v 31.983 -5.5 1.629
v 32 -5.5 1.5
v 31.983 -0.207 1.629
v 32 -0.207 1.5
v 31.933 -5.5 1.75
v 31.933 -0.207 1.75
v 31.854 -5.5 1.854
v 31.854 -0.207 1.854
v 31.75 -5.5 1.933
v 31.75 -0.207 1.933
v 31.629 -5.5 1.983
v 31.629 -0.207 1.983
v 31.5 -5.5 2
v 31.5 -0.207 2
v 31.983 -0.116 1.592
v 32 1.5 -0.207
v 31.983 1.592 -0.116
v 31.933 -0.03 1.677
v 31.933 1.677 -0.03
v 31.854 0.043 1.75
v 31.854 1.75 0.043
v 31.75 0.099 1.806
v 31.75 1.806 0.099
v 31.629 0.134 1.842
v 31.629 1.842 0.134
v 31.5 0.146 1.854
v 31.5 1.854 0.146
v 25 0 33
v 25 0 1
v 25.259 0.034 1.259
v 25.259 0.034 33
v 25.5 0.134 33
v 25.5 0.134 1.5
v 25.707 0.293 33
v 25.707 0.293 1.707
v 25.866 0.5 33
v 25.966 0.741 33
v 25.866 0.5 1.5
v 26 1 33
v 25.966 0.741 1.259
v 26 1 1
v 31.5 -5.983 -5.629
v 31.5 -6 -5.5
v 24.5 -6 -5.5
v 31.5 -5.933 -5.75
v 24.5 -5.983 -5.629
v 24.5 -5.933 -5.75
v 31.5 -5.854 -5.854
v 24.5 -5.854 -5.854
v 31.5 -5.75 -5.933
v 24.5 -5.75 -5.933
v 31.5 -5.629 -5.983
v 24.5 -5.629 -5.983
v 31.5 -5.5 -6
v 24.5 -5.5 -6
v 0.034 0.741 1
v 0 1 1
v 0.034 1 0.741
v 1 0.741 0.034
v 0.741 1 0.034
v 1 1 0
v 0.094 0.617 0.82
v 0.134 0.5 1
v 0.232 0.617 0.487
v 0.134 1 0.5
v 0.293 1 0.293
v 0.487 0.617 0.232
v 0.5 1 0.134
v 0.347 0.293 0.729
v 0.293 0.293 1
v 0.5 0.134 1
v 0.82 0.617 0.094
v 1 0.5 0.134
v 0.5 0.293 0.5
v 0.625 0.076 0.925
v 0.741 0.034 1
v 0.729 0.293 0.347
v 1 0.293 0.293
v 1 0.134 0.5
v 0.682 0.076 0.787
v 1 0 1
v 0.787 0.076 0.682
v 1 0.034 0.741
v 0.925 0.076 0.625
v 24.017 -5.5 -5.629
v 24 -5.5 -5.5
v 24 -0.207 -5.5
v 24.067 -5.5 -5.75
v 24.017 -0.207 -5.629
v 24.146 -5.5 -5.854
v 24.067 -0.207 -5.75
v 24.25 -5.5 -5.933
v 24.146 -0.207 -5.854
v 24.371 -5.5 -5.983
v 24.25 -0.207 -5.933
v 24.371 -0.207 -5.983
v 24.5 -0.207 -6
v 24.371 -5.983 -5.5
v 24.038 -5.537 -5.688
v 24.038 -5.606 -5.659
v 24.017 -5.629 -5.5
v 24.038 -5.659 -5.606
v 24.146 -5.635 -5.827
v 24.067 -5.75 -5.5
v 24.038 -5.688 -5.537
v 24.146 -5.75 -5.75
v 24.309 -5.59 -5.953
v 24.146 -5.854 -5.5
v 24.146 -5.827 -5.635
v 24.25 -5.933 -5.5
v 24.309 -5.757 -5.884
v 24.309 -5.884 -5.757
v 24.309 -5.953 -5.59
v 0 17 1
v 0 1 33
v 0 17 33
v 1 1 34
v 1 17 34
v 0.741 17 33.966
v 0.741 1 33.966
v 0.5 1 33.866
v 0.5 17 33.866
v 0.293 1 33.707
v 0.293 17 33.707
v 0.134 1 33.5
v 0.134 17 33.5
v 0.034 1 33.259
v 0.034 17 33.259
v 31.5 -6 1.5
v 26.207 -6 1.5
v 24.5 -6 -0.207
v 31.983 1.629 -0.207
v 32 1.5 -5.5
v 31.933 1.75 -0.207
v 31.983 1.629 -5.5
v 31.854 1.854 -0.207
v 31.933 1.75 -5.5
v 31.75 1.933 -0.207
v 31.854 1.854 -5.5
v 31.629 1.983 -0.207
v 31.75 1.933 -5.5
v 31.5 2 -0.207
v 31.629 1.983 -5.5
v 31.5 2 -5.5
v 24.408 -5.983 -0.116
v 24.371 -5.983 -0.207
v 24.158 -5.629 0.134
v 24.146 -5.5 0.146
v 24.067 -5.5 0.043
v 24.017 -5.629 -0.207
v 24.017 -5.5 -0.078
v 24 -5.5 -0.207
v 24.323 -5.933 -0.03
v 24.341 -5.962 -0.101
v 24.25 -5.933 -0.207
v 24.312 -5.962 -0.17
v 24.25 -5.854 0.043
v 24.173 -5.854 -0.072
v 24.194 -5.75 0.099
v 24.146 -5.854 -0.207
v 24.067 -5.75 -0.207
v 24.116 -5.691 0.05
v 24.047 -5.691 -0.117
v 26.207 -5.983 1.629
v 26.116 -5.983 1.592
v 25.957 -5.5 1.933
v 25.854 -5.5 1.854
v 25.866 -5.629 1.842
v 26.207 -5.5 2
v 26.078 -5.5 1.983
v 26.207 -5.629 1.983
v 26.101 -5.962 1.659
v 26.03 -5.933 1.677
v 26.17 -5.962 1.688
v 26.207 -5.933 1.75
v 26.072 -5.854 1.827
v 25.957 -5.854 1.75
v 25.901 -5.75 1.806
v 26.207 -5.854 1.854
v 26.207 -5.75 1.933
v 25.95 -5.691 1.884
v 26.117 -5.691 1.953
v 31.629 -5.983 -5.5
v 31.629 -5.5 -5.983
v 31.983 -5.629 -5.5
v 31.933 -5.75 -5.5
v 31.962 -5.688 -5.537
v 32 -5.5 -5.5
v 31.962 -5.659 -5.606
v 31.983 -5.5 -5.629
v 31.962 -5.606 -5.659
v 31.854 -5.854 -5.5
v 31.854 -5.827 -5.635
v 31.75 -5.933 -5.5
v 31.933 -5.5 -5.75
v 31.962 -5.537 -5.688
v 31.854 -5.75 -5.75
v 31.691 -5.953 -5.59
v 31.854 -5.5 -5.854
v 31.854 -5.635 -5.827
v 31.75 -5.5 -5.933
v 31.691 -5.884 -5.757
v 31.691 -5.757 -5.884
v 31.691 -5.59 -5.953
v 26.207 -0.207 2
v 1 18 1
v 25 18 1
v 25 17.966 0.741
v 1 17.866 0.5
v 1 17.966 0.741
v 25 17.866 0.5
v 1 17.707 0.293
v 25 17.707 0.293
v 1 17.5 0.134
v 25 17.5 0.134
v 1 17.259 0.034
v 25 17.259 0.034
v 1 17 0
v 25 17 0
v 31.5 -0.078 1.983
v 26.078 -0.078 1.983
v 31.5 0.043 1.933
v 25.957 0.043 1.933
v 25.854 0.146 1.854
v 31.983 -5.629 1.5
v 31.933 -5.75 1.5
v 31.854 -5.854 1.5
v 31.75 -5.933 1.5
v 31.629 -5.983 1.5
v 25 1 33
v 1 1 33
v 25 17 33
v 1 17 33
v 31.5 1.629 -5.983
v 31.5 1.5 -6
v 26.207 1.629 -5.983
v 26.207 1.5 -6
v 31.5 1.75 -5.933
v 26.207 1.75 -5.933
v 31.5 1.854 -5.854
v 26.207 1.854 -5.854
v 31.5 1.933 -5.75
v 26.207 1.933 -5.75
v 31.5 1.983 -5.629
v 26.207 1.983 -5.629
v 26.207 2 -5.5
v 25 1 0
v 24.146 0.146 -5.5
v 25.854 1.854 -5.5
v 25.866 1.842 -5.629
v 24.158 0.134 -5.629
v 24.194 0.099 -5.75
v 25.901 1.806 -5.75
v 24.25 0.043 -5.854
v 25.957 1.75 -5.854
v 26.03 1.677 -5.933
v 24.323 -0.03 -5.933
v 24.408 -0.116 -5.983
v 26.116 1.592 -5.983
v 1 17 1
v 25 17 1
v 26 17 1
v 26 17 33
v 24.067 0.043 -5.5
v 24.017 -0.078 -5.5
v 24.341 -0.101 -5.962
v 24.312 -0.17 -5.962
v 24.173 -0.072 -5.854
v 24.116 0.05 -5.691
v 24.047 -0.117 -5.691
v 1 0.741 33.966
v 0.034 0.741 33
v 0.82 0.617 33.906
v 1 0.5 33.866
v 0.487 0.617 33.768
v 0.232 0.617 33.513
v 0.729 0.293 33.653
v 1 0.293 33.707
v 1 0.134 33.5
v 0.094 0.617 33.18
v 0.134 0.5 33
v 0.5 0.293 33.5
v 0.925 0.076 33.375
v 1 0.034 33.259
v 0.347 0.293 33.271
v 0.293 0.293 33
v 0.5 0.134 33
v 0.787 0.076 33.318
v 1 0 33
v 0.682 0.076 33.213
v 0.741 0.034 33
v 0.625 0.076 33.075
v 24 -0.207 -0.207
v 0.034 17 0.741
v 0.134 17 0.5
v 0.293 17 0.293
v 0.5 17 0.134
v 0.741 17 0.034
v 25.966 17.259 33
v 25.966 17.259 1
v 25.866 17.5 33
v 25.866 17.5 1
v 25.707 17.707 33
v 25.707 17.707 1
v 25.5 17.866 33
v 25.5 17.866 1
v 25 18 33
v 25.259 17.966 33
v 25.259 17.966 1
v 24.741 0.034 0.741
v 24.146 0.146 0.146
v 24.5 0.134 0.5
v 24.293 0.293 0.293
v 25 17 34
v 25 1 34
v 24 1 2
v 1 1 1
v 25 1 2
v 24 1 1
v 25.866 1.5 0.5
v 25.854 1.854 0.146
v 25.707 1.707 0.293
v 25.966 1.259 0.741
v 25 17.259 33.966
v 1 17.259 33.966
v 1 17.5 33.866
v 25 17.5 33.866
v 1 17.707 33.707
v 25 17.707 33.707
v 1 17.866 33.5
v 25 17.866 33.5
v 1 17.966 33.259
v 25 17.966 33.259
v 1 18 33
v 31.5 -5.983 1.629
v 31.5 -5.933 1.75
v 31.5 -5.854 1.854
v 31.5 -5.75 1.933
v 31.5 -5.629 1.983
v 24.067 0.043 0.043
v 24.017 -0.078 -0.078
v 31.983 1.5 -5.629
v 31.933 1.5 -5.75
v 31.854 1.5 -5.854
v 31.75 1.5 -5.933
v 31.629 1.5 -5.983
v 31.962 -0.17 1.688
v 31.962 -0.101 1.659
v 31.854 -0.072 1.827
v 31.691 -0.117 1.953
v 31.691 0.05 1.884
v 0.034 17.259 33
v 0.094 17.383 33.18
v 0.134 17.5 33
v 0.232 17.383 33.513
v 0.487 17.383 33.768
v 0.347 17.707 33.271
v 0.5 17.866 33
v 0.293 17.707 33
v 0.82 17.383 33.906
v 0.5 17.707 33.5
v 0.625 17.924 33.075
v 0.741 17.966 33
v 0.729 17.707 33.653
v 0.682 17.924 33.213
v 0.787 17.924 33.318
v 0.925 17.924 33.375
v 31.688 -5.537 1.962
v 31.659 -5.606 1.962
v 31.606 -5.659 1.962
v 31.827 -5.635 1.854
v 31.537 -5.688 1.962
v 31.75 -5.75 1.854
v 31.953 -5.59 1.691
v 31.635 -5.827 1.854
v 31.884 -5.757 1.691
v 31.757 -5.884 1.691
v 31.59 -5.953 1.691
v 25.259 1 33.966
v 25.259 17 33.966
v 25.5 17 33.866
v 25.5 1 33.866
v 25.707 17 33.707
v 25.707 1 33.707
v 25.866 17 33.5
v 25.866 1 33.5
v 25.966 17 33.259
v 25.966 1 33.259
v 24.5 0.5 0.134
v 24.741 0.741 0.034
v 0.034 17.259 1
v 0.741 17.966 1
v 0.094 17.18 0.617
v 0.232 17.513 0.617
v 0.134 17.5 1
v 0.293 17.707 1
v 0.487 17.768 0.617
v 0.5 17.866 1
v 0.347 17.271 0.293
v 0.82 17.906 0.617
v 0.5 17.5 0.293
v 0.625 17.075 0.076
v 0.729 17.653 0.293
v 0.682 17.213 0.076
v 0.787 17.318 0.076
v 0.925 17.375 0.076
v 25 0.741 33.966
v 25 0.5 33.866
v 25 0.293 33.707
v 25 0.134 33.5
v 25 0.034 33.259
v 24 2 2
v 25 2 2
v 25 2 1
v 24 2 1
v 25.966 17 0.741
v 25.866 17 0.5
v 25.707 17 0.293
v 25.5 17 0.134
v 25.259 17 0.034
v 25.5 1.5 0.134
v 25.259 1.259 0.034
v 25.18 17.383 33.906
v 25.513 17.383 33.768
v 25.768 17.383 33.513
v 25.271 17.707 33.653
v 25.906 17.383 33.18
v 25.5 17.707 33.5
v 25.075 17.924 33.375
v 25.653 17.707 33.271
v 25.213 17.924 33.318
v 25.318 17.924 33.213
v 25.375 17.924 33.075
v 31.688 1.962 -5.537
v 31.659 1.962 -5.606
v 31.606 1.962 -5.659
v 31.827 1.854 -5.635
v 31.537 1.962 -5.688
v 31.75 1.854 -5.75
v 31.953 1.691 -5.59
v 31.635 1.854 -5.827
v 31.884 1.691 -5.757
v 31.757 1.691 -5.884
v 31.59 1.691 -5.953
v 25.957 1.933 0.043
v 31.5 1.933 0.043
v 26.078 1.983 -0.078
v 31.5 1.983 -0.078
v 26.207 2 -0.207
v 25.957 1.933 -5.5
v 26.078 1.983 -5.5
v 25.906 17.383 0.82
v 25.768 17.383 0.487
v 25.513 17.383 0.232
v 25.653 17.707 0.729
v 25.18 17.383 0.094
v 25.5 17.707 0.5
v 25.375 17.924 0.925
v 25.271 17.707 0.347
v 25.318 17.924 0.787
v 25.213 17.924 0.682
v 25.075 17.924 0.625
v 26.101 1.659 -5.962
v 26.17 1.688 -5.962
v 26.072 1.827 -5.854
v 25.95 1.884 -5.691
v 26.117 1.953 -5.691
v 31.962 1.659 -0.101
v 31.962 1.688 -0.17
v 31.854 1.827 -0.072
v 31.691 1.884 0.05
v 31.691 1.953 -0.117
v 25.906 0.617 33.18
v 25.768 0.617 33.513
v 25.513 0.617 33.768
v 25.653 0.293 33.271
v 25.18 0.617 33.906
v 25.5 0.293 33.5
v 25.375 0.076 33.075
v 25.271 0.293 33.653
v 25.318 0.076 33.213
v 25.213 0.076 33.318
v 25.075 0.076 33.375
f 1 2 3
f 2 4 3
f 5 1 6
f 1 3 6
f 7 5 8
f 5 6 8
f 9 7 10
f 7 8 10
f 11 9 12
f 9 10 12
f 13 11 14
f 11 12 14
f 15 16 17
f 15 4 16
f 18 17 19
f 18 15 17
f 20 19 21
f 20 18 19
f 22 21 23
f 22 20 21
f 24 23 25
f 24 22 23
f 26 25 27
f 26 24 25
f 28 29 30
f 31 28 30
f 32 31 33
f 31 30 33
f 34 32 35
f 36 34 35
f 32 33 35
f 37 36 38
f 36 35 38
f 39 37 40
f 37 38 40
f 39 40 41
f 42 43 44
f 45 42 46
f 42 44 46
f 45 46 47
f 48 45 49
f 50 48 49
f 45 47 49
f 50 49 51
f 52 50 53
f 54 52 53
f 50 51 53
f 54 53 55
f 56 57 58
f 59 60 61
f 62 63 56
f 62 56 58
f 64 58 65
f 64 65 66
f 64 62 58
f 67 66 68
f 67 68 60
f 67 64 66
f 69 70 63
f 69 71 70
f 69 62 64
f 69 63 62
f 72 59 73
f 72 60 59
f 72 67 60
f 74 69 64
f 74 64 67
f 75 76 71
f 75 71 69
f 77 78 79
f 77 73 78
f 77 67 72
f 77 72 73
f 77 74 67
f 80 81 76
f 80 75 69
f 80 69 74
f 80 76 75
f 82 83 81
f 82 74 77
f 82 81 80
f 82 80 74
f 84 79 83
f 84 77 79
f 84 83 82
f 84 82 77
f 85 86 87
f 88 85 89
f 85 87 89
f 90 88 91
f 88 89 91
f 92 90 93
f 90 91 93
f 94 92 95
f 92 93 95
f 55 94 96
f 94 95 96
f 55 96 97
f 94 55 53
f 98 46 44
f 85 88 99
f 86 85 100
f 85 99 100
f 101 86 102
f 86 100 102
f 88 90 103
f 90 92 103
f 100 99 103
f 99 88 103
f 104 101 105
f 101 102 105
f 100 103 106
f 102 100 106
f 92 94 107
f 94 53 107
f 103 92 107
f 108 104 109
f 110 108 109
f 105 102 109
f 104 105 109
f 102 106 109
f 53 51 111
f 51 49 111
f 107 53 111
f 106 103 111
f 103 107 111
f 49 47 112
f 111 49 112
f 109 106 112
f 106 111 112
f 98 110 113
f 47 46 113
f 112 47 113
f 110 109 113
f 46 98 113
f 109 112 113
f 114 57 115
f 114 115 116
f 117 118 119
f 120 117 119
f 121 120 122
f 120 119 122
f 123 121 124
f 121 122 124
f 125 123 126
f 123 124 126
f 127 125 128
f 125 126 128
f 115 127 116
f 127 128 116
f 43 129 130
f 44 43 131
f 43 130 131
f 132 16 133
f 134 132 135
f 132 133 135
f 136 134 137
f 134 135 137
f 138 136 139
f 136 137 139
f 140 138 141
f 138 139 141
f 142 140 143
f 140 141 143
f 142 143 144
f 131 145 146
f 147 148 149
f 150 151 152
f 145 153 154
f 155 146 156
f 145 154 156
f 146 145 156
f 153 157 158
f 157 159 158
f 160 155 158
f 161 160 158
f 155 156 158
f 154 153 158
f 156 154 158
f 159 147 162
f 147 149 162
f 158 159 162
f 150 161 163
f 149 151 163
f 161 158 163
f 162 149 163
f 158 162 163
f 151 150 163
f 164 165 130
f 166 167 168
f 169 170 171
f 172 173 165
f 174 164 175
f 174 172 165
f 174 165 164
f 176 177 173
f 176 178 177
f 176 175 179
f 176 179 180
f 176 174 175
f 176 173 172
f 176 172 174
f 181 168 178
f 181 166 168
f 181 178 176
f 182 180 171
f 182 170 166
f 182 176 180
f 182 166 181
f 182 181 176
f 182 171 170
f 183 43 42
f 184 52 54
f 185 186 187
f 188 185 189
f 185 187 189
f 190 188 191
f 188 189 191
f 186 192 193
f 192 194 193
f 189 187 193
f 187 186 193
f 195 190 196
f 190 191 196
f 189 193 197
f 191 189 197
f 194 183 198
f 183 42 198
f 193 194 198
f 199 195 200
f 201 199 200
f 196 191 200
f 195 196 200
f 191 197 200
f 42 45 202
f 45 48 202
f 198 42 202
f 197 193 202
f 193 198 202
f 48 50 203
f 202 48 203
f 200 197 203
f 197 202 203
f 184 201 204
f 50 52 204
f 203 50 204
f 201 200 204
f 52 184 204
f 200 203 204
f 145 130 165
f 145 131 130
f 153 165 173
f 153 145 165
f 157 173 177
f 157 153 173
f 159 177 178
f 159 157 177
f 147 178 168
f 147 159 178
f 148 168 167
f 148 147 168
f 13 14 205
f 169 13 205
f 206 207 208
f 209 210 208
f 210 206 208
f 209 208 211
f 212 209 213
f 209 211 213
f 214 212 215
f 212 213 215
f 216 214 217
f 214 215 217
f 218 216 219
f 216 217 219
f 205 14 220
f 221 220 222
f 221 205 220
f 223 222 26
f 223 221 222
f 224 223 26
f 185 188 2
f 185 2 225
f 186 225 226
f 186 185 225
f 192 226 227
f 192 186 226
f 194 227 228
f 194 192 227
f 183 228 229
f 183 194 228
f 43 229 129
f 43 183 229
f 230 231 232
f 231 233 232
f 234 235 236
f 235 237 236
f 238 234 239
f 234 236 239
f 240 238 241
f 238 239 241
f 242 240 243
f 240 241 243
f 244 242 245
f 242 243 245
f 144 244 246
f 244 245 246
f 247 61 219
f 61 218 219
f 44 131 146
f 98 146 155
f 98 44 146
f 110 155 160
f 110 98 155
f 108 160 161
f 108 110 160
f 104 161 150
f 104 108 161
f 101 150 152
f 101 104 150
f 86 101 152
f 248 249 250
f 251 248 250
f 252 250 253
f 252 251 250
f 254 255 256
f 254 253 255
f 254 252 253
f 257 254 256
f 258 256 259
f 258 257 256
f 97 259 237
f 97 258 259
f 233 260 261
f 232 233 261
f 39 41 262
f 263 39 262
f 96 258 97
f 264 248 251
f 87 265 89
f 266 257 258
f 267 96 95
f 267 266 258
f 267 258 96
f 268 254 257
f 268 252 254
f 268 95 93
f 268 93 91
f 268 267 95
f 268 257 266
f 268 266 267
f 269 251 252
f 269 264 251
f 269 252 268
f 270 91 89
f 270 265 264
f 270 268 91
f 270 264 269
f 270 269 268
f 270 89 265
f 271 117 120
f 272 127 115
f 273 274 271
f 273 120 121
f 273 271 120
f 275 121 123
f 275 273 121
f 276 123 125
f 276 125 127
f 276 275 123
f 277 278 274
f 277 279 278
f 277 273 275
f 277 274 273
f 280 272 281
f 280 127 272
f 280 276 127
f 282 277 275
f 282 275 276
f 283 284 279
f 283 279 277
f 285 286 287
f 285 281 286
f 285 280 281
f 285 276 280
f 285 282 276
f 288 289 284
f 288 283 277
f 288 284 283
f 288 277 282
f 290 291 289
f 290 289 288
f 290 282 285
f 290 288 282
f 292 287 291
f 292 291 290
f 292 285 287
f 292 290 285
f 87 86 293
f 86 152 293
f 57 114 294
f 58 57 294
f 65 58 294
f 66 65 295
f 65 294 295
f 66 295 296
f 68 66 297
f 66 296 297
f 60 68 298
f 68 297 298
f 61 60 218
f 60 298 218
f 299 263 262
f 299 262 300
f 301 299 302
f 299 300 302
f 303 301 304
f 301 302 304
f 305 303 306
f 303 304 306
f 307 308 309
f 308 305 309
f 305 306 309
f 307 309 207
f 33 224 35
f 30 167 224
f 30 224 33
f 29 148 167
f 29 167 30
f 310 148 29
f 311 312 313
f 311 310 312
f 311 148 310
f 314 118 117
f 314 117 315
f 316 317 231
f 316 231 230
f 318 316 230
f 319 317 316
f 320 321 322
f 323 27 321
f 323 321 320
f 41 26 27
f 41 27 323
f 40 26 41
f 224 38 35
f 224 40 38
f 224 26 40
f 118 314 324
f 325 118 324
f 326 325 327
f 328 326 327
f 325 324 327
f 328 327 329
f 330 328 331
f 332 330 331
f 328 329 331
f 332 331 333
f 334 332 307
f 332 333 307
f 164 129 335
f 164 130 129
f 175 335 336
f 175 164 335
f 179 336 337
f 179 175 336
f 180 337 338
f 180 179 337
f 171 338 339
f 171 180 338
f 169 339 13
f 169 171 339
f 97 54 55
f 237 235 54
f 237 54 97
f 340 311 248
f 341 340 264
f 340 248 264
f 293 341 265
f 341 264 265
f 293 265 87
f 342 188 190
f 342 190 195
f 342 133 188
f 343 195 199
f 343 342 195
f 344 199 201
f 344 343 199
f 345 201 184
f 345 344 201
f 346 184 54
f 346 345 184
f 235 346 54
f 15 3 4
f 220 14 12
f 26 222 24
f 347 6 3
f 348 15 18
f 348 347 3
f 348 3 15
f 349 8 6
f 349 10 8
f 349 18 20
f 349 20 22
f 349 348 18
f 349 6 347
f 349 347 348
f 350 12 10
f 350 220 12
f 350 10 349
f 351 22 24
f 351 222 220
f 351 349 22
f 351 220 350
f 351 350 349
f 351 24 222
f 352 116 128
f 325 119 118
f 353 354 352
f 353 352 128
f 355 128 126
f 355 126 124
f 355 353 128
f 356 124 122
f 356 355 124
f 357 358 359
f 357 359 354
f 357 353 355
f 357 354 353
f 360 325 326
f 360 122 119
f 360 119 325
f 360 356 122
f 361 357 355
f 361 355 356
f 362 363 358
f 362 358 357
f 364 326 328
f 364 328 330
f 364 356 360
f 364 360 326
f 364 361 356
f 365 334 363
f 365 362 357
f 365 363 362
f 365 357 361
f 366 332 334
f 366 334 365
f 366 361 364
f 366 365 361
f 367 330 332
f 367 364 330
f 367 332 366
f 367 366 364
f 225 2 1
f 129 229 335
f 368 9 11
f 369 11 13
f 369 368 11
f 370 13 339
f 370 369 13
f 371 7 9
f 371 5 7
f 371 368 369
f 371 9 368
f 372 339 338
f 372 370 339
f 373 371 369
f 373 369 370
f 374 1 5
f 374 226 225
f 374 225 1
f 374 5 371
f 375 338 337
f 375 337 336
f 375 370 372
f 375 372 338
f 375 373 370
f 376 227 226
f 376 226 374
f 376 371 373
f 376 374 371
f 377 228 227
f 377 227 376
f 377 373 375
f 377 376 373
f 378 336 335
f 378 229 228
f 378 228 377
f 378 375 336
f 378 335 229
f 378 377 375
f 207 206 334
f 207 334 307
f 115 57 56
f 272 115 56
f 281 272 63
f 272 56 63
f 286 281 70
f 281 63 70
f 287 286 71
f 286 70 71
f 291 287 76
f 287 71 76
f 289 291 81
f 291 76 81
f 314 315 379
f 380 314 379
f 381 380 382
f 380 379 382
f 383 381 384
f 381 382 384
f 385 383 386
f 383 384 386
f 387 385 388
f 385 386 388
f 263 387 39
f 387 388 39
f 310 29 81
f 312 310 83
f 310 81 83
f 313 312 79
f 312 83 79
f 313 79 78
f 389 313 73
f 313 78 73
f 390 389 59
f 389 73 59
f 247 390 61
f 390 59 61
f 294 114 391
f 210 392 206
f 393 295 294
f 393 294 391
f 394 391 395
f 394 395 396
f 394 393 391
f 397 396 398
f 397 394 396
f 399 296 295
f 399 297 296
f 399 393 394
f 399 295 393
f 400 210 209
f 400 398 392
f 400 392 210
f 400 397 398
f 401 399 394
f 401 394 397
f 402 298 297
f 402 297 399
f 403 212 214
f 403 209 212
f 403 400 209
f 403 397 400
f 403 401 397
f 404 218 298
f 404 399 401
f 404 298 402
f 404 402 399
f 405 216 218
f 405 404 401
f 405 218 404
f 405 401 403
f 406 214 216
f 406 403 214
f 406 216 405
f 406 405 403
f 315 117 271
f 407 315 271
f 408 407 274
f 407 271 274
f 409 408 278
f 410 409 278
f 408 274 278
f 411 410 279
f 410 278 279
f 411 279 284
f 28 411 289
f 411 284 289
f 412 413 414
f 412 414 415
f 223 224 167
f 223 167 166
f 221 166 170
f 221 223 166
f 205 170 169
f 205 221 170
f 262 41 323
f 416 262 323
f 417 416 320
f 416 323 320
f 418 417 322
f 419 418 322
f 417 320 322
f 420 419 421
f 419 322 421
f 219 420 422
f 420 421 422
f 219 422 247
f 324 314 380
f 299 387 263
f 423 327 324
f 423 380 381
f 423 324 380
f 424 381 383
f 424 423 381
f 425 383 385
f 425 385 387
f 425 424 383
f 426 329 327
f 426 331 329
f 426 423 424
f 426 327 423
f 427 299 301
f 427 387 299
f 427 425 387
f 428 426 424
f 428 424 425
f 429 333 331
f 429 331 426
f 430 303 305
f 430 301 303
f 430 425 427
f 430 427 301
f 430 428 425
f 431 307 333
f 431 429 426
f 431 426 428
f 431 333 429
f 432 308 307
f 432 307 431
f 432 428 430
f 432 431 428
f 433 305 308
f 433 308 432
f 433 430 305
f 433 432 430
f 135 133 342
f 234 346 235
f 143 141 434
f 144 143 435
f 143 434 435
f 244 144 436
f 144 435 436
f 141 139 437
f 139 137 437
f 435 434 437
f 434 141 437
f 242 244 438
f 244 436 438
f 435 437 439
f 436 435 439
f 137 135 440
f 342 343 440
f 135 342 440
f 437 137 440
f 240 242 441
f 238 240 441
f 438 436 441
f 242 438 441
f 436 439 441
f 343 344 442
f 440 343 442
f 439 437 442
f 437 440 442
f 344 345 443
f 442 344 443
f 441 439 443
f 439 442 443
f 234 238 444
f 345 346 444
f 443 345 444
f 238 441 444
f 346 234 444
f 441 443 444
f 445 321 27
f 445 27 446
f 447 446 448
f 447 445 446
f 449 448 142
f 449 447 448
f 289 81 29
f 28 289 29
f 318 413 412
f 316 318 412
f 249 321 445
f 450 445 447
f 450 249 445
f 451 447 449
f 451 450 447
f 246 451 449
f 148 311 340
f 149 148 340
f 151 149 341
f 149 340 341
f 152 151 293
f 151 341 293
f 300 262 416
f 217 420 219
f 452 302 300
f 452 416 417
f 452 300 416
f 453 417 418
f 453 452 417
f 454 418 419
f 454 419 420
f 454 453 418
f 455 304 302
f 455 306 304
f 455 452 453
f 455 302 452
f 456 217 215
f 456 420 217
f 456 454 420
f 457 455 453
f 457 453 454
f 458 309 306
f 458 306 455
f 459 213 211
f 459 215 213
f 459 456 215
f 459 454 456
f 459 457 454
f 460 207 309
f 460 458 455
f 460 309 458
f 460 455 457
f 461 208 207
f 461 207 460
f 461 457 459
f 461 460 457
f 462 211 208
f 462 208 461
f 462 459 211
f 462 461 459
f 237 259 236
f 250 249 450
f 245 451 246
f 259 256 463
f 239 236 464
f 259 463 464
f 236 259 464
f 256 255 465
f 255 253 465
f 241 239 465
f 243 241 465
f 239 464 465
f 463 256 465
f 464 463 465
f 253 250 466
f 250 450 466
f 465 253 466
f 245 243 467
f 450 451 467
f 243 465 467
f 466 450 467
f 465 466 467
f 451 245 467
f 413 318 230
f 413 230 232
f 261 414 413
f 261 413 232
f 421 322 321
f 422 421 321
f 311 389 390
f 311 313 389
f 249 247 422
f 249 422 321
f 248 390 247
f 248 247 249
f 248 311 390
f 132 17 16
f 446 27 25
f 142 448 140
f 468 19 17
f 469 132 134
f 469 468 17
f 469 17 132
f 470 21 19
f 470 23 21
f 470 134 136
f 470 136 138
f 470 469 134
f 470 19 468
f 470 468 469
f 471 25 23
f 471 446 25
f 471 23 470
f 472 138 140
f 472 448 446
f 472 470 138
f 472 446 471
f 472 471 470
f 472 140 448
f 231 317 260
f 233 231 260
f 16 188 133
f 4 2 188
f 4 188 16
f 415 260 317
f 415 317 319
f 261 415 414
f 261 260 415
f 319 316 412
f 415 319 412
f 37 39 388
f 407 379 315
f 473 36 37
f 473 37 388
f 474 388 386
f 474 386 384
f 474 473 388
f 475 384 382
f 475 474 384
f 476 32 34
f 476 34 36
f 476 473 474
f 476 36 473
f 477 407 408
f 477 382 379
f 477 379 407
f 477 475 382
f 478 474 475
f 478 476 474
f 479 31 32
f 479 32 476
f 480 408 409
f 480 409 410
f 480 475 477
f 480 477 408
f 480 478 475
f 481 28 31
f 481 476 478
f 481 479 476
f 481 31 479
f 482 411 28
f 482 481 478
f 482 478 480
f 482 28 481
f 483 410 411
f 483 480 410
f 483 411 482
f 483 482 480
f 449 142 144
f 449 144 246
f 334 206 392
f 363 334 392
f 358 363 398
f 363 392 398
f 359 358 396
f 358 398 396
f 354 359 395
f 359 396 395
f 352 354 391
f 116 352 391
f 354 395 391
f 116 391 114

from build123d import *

# Parameters (mm, degrees)
SKETCH1_W                = 26
SKETCH1_H                = 18
BOSS_EXTRUDE1_DEPTH      = 34
SHELL1_T                 = 1
BOSS_EXTRUDE3_DEPTH      = 6
BOSS_EXTRUDE3_DEPTH_BACK = 2
SKETCH2_W                = 8
SKETCH2_H                = 8
CHAMFER2_SIZE            = 2
FILLET1_R                = 1
FILLET2_R                = 0.5


with BuildPart() as part:
    # Sketch1 → Boss-Extrude1 (new body)
    with BuildSketch(Plane.XY):
        with Locations((13, 9)):
            Rectangle(SKETCH1_W, SKETCH1_H)
    extrude(amount=BOSS_EXTRUDE1_DEPTH)

    # Shell1 (no face opened: a closed hollow body)
    add(offset(amount=-SHELL1_T, mode=Mode.PRIVATE), mode=Mode.SUBTRACT)

    # Sketch2 → Boss-Extrude3 (add, two sides: drawn at the far end of the back side and taken through both)
    with BuildSketch(Plane(origin=(0, 0, 0), x_dir=(-1, 0, 0), z_dir=(0, 0, -1)).offset(-BOSS_EXTRUDE3_DEPTH_BACK)):
        with Locations((-28, -2)):
            Rectangle(SKETCH2_W, SKETCH2_H)
    extrude(amount=BOSS_EXTRUDE3_DEPTH + BOSS_EXTRUDE3_DEPTH_BACK)

    # Chamfer2
    chamfer2_edges = [part.edges().sort_by_distance(p)[0] for p in [
        (24, -3, 2),
        (24, 2, -3),
        (29, 2, 2),
    ]]
    chamfer(chamfer2_edges, length=CHAMFER2_SIZE)

    # Fillet1
    # the kernel refuses this fillet: 1 mm, written as the material it takes off along each edge
    with BuildSketch(Plane(origin=(1, 17, 1), x_dir=(0, 1, 0), z_dir=(0, 0, -1))) as fillet1_piece_1_section:
        Polygon((0, 0), (FILLET1_R, 0), (FILLET1_R, -FILLET1_R), (0, -FILLET1_R), align=None)
    fillet1_piece_1 = extrude(amount=FILLET1_R, mode=Mode.PRIVATE)
    fillet1_piece_1 = fillet1_piece_1 - Plane(origin=(1, 17, 1), x_dir=(0.7071067811865476, -0.7071067811865475, 0), z_dir=(0, 0, -1)) * Sphere(FILLET1_R, mode=Mode.PRIVATE)
    add(fillet1_piece_1, mode=Mode.SUBTRACT)
    with BuildSketch(Plane(origin=(1, 1, 1), x_dir=(0, 0, -1), z_dir=(0, -1, 0))) as fillet1_piece_2_section:
        Polygon((0, 0), (FILLET1_R, 0), (FILLET1_R, -FILLET1_R), (0, -FILLET1_R), align=None)
    fillet1_piece_2 = extrude(amount=FILLET1_R, mode=Mode.PRIVATE)
    fillet1_piece_2 = fillet1_piece_2 - Plane(origin=(1, 1, 1), x_dir=(0.7071067811865475, 0, 0.7071067811865475), z_dir=(0, -1, 0)) * Sphere(FILLET1_R, mode=Mode.PRIVATE)
    add(fillet1_piece_2, mode=Mode.SUBTRACT)
    with BuildSketch(Plane(origin=(25, 17, 1), x_dir=(0, 0, -1), z_dir=(0, 1, 0))) as fillet1_piece_3_section:
        Polygon((0, 0), (FILLET1_R, 0), (FILLET1_R, -FILLET1_R), (0, -FILLET1_R), align=None)
    fillet1_piece_3 = extrude(amount=FILLET1_R, mode=Mode.PRIVATE)
    fillet1_piece_3 = fillet1_piece_3 - Plane(origin=(25, 17, 1), x_dir=(-0.7071067811865475, 0, 0.7071067811865475), z_dir=(0, 1, 0)) * Sphere(FILLET1_R, mode=Mode.PRIVATE)
    add(fillet1_piece_3, mode=Mode.SUBTRACT)
    with BuildSketch(Plane(origin=(1, 1, 33), x_dir=(-1, 0, 0), z_dir=(0, -1, 0))) as fillet1_piece_4_section:
        Polygon((0, 0), (FILLET1_R, 0), (FILLET1_R, -FILLET1_R), (0, -FILLET1_R), align=None)
    fillet1_piece_4 = extrude(amount=FILLET1_R, mode=Mode.PRIVATE)
    fillet1_piece_4 = fillet1_piece_4 - Plane(origin=(1, 1, 33), x_dir=(0.7071067811865475, 0, -0.7071067811865475), z_dir=(0, -1, 0)) * Sphere(FILLET1_R, mode=Mode.PRIVATE)
    add(fillet1_piece_4, mode=Mode.SUBTRACT)
    with BuildSketch(Plane(origin=(25, 1, 33), x_dir=(1, 0, 0), z_dir=(0, -1, 0))) as fillet1_piece_5_section:
        Polygon((0, 0), (FILLET1_R, 0), (FILLET1_R, FILLET1_R), (0, FILLET1_R), align=None)
    fillet1_piece_5 = extrude(amount=FILLET1_R, mode=Mode.PRIVATE)
    fillet1_piece_5 = fillet1_piece_5 - Plane(origin=(25, 1, 33), x_dir=(-0.7071067811865475, 0, -0.7071067811865475), z_dir=(0, -1, 0)) * Sphere(FILLET1_R, mode=Mode.PRIVATE)
    add(fillet1_piece_5, mode=Mode.SUBTRACT)
    with BuildSketch(Plane(origin=(25, 17, 33), x_dir=(1, 0, 0), z_dir=(0, 1, 0))) as fillet1_piece_6_section:
        Polygon((0, 0), (FILLET1_R, 0), (FILLET1_R, -FILLET1_R), (0, -FILLET1_R), align=None)
    fillet1_piece_6 = extrude(amount=FILLET1_R, mode=Mode.PRIVATE)
    fillet1_piece_6 = fillet1_piece_6 - Plane(origin=(25, 17, 33), x_dir=(-0.7071067811865475, 0, -0.7071067811865475), z_dir=(0, 1, 0)) * Sphere(FILLET1_R, mode=Mode.PRIVATE)
    add(fillet1_piece_6, mode=Mode.SUBTRACT)
    with BuildSketch(Plane(origin=(1, 17, 33), x_dir=(-1, 0, 0), z_dir=(0, 1, 0))) as fillet1_piece_7_section:
        Polygon((0, 0), (FILLET1_R, 0), (FILLET1_R, FILLET1_R), (0, FILLET1_R), align=None)
    fillet1_piece_7 = extrude(amount=FILLET1_R, mode=Mode.PRIVATE)
    fillet1_piece_7 = fillet1_piece_7 - Plane(origin=(1, 17, 33), x_dir=(0.7071067811865475, 0, -0.7071067811865475), z_dir=(0, 1, 0)) * Sphere(FILLET1_R, mode=Mode.PRIVATE)
    add(fillet1_piece_7, mode=Mode.SUBTRACT)
    with BuildSketch(Plane(origin=(0, 17, 0), x_dir=(1, 0, 0), z_dir=(0, -1, 0)), Plane(origin=(26, 1, 34), x_dir=(0, 0, -1), z_dir=(0, 1, 0)), Plane(origin=(0, 17, 34), x_dir=(0, 0, -1), z_dir=(0, -1, 0))) as fillet1_piece_8:
        with BuildLine():
            CenterArc((FILLET1_R, FILLET1_R), FILLET1_R, 180, 90)
            Line((0, FILLET1_R), (0, 0))
            Line((0, 0), (FILLET1_R, 0))
        make_face()
    extrude(amount=16, mode=Mode.SUBTRACT)
    with BuildSketch(Plane(origin=(1, 0, 0), x_dir=(0, 0, 1), z_dir=(1, 0, 0))) as fillet1_piece_9_section:
        with BuildLine():
            CenterArc((FILLET1_R, -FILLET1_R), FILLET1_R, 90, 90)
            Line((0, -FILLET1_R), (0, 0))
            Line((0, 0), (FILLET1_R, 0))
        make_face()
    fillet1_piece_9 = extrude(amount=25.5, mode=Mode.PRIVATE)
    fillet1_piece_9 = split(fillet1_piece_9, bisect_by=Plane(origin=(18.381826638, 0.226414546, -5.618173362), z_dir=(-0.7071067811865476, 0, 0.7071067811865476)), keep=Keep.TOP, mode=Mode.PRIVATE)
    fillet1_piece_9 = split(fillet1_piece_9, bisect_by=Plane(origin=(18.381826638, -5.618173362, 0.226414546), z_dir=(-0.7071067811865475, 0.7071067811865476, 0)), keep=Keep.TOP, mode=Mode.PRIVATE)
    add(fillet1_piece_9, mode=Mode.SUBTRACT)
    with BuildSketch(Plane(origin=(1, 0, 0), x_dir=(0, 0, 1), z_dir=(1, 0, 0))) as fillet1_piece_10_section:
        with BuildLine():
            CenterArc((FILLET1_R, -FILLET1_R), FILLET1_R, 90, 90)
            Line((0, -FILLET1_R), (0, 0))
            Line((0, 0), (FILLET1_R, 0))
        make_face()
    fillet1_piece_10 = extrude(amount=25.5, mode=Mode.PRIVATE)
    fillet1_piece_10 = split(fillet1_piece_10, bisect_by=Plane(origin=(24.16446835, 0.528927527, 0.16446835), z_dir=(0.7071067811865476, 0, -0.7071067811865476)), keep=Keep.TOP, mode=Mode.PRIVATE)
    fillet1_piece_10 = split(fillet1_piece_10, bisect_by=Plane(origin=(24.407441135, 0.407441135, 0.042981958), z_dir=(-0.7071067811865475, 0.7071067811865476, 0)), keep=Keep.TOP, mode=Mode.PRIVATE)
    add(fillet1_piece_10, mode=Mode.SUBTRACT)
    with BuildSketch(Plane(origin=(1, 0, 0), x_dir=(0, 0, 1), z_dir=(1, 0, 0))) as fillet1_piece_11_section:
        with BuildLine():
            CenterArc((FILLET1_R, -FILLET1_R), FILLET1_R, 90, 90)
            Line((0, -FILLET1_R), (0, 0))
            Line((0, 0), (FILLET1_R, 0))
        make_face()
    fillet1_piece_11 = extrude(amount=25.5, mode=Mode.PRIVATE)
    fillet1_piece_11 = split(fillet1_piece_11, bisect_by=Plane(origin=(24.407441135, 0.042981958, 0.407441135), z_dir=(-0.7071067811865476, 0, 0.7071067811865476)), keep=Keep.TOP, mode=Mode.PRIVATE)
    fillet1_piece_11 = split(fillet1_piece_11, bisect_by=Plane(origin=(24.16446835, 0.16446835, 0.528927527), z_dir=(0.7071067811865475, -0.7071067811865476, 0)), keep=Keep.TOP, mode=Mode.PRIVATE)
    add(fillet1_piece_11, mode=Mode.SUBTRACT)
    with BuildSketch(Plane(origin=(26, -0.5, 0), x_dir=(-1, 0, 0), z_dir=(0, 1, 0))) as fillet1_piece_12_section:
        with BuildLine():
            CenterArc((FILLET1_R, FILLET1_R), FILLET1_R, 180, 90)
            Line((0, FILLET1_R), (0, 0))
            Line((0, 0), (FILLET1_R, 0))
        make_face()
    fillet1_piece_12 = extrude(amount=17.5, mode=Mode.PRIVATE)
    fillet1_piece_12 = split(fillet1_piece_12, bisect_by=Plane(origin=(25.83553165, 1.83553165, 0.528927527), z_dir=(0.7071067811865475, -0.7071067811865476, 0)), keep=Keep.TOP, mode=Mode.PRIVATE)
    fillet1_piece_12 = split(fillet1_piece_12, bisect_by=Plane(origin=(25.957018042, 1.592558865, 0.407441135), z_dir=(0, 0.7071067811865476, 0.7071067811865476)), keep=Keep.TOP, mode=Mode.PRIVATE)
    add(fillet1_piece_12, mode=Mode.SUBTRACT)
    with BuildSketch(Plane(origin=(26, -0.5, 0), x_dir=(-1, 0, 0), z_dir=(0, 1, 0))) as fillet1_piece_13_section:
        with BuildLine():
            CenterArc((FILLET1_R, FILLET1_R), FILLET1_R, 180, 90)
            Line((0, FILLET1_R), (0, 0))
            Line((0, 0), (FILLET1_R, 0))
        make_face()
    fillet1_piece_13 = extrude(amount=17.5, mode=Mode.PRIVATE)
    fillet1_piece_13 = split(fillet1_piece_13, bisect_by=Plane(origin=(25.592558865, 1.592558865, 0.042981958), z_dir=(-0.7071067811865475, 0.7071067811865476, 0)), keep=Keep.TOP, mode=Mode.PRIVATE)
    fillet1_piece_13 = split(fillet1_piece_13, bisect_by=Plane(origin=(25.471072473, 1.83553165, 0.16446835), z_dir=(0, -0.7071067811865476, -0.7071067811865476)), keep=Keep.TOP, mode=Mode.PRIVATE)
    add(fillet1_piece_13, mode=Mode.SUBTRACT)
    with BuildSketch(Plane(origin=(26, -0.5, 0), x_dir=(-1, 0, 0), z_dir=(0, 1, 0))) as fillet1_piece_14_section:
        with BuildLine():
            CenterArc((FILLET1_R, FILLET1_R), FILLET1_R, 180, 90)
            Line((0, FILLET1_R), (0, 0))
            Line((0, 0), (FILLET1_R, 0))
        make_face()
    fillet1_piece_14 = extrude(amount=17.5, mode=Mode.PRIVATE)
    fillet1_piece_14 = split(fillet1_piece_14, bisect_by=Plane(origin=(29.618138272, 5.618138272, 0.226424858), z_dir=(-0.7071067811865475, 0.7071067811865476, 0)), keep=Keep.TOP, mode=Mode.PRIVATE)
    fillet1_piece_14 = split(fillet1_piece_14, bisect_by=Plane(origin=(25.773575142, 5.618138272, -3.618138272), z_dir=(0, 0.7071067811865476, 0.7071067811865476)), keep=Keep.TOP, mode=Mode.PRIVATE)
    add(fillet1_piece_14, mode=Mode.SUBTRACT)
    with BuildSketch(Plane(origin=(25, 18, 0), x_dir=(0, -1, 0), z_dir=(-1, 0, 0)), Plane(origin=(1, 0, 34), x_dir=(0, 0, -1), z_dir=(1, 0, 0))) as fillet1_piece_15:
        with BuildLine():
            CenterArc((FILLET1_R, FILLET1_R), FILLET1_R, 180, 90)
            Line((0, FILLET1_R), (0, 0))
            Line((0, 0), (FILLET1_R, 0))
        make_face()
    extrude(amount=24, mode=Mode.SUBTRACT)
    with BuildSketch(Plane(origin=(25, 18, 34), x_dir=(0, -1, 0), z_dir=(-1, 0, 0))) as fillet1_piece_16:
        with BuildLine():
            CenterArc((FILLET1_R, -FILLET1_R), FILLET1_R, 90, 90)
            Line((0, -FILLET1_R), (0, 0))
            Line((0, 0), (FILLET1_R, 0))
        make_face()
    extrude(amount=24, mode=Mode.SUBTRACT)
    with BuildSketch(Plane(origin=(0, 18, 1), x_dir=(0, -1, 0), z_dir=(0, 0, 1)), Plane(origin=(0, 0, 1), x_dir=(1, 0, 0), z_dir=(0, 0, 1))) as fillet1_piece_17:
        with BuildLine():
            CenterArc((FILLET1_R, FILLET1_R), FILLET1_R, 180, 90)
            Line((0, FILLET1_R), (0, 0))
            Line((0, 0), (FILLET1_R, 0))
        make_face()
    extrude(amount=32, mode=Mode.SUBTRACT)
    with BuildSketch(Plane(origin=(26, 18, 1), x_dir=(0, -1, 0), z_dir=(0, 0, 1))) as fillet1_piece_18:
        with BuildLine():
            CenterArc((FILLET1_R, -FILLET1_R), FILLET1_R, 90, 90)
            Line((0, -FILLET1_R), (0, 0))
            Line((0, 0), (FILLET1_R, 0))
        make_face()
    extrude(amount=32, mode=Mode.SUBTRACT)
    with BuildSketch(Plane(origin=(26, 0, -0.5), x_dir=(-1, 0, 0), z_dir=(0, 0, 1))) as fillet1_piece_19_section:
        with BuildLine():
            CenterArc((FILLET1_R, -FILLET1_R), FILLET1_R, 90, 90)
            Line((0, -FILLET1_R), (0, 0))
            Line((0, 0), (FILLET1_R, 0))
        make_face()
    fillet1_piece_19 = extrude(amount=33.5, mode=Mode.PRIVATE)
    fillet1_piece_19 = split(fillet1_piece_19, bisect_by=Plane(origin=(25.83553165, 0.528927527, 1.83553165), z_dir=(0.7071067811865476, 0, -0.7071067811865476)), keep=Keep.TOP, mode=Mode.PRIVATE)
    fillet1_piece_19 = split(fillet1_piece_19, bisect_by=Plane(origin=(25.957018042, 0.407441135, 1.592558865), z_dir=(0, 0.7071067811865476, 0.7071067811865476)), keep=Keep.TOP, mode=Mode.PRIVATE)
    add(fillet1_piece_19, mode=Mode.SUBTRACT)
    with BuildSketch(Plane(origin=(26, 0, -0.5), x_dir=(-1, 0, 0), z_dir=(0, 0, 1))) as fillet1_piece_20_section:
        with BuildLine():
            CenterArc((FILLET1_R, -FILLET1_R), FILLET1_R, 90, 90)
            Line((0, -FILLET1_R), (0, 0))
            Line((0, 0), (FILLET1_R, 0))
        make_face()
    fillet1_piece_20 = extrude(amount=33.5, mode=Mode.PRIVATE)
    fillet1_piece_20 = split(fillet1_piece_20, bisect_by=Plane(origin=(25.592558865, 0.042981958, 1.592558865), z_dir=(-0.7071067811865476, 0, 0.7071067811865476)), keep=Keep.TOP, mode=Mode.PRIVATE)
    fillet1_piece_20 = split(fillet1_piece_20, bisect_by=Plane(origin=(25.471072473, 0.16446835, 1.83553165), z_dir=(0, -0.7071067811865476, -0.7071067811865476)), keep=Keep.TOP, mode=Mode.PRIVATE)
    add(fillet1_piece_20, mode=Mode.SUBTRACT)
    with BuildSketch(Plane(origin=(26, 0, -0.5), x_dir=(-1, 0, 0), z_dir=(0, 0, 1))) as fillet1_piece_21_section:
        with BuildLine():
            CenterArc((FILLET1_R, -FILLET1_R), FILLET1_R, 90, 90)
            Line((0, -FILLET1_R), (0, 0))
            Line((0, 0), (FILLET1_R, 0))
        make_face()
    fillet1_piece_21 = extrude(amount=33.5, mode=Mode.PRIVATE)
    fillet1_piece_21 = split(fillet1_piece_21, bisect_by=Plane(origin=(33.618190384, 0.226409543, 9.618190384), z_dir=(-0.7071067811865476, 0, 0.7071067811865476)), keep=Keep.TOP, mode=Mode.PRIVATE)
    fillet1_piece_21 = split(fillet1_piece_21, bisect_by=Plane(origin=(25.773590457, -7.618190384, 9.618190384), z_dir=(0, 0.7071067811865476, 0.7071067811865476)), keep=Keep.TOP, mode=Mode.PRIVATE)
    add(fillet1_piece_21, mode=Mode.SUBTRACT)

    # Fillet2
    fillet2_edges = [part.edges().sort_by_distance(p)[0] for p in [
        (28, -6, -6),
        (32, -6, -2),
        (32, -2, -6),
        (32, 2, -3),
        (29, 2, -6),
        (26, 2, -3),
        (29, 2, 0),
        (32, -3, 2),
        (32, 1, 1),
        (29, -6, 2),
        (26, -3, 2),
        (29, 0, 2),
        (24, -3, -6),
        (24, -6, -3),
        (24, -3, 0),
        (24, 0, -3),
        (25, 1, -6),
        (25, -6, 1),
    ]]
    fillet(fillet2_edges, radius=FILLET2_R)


solid = part.part
